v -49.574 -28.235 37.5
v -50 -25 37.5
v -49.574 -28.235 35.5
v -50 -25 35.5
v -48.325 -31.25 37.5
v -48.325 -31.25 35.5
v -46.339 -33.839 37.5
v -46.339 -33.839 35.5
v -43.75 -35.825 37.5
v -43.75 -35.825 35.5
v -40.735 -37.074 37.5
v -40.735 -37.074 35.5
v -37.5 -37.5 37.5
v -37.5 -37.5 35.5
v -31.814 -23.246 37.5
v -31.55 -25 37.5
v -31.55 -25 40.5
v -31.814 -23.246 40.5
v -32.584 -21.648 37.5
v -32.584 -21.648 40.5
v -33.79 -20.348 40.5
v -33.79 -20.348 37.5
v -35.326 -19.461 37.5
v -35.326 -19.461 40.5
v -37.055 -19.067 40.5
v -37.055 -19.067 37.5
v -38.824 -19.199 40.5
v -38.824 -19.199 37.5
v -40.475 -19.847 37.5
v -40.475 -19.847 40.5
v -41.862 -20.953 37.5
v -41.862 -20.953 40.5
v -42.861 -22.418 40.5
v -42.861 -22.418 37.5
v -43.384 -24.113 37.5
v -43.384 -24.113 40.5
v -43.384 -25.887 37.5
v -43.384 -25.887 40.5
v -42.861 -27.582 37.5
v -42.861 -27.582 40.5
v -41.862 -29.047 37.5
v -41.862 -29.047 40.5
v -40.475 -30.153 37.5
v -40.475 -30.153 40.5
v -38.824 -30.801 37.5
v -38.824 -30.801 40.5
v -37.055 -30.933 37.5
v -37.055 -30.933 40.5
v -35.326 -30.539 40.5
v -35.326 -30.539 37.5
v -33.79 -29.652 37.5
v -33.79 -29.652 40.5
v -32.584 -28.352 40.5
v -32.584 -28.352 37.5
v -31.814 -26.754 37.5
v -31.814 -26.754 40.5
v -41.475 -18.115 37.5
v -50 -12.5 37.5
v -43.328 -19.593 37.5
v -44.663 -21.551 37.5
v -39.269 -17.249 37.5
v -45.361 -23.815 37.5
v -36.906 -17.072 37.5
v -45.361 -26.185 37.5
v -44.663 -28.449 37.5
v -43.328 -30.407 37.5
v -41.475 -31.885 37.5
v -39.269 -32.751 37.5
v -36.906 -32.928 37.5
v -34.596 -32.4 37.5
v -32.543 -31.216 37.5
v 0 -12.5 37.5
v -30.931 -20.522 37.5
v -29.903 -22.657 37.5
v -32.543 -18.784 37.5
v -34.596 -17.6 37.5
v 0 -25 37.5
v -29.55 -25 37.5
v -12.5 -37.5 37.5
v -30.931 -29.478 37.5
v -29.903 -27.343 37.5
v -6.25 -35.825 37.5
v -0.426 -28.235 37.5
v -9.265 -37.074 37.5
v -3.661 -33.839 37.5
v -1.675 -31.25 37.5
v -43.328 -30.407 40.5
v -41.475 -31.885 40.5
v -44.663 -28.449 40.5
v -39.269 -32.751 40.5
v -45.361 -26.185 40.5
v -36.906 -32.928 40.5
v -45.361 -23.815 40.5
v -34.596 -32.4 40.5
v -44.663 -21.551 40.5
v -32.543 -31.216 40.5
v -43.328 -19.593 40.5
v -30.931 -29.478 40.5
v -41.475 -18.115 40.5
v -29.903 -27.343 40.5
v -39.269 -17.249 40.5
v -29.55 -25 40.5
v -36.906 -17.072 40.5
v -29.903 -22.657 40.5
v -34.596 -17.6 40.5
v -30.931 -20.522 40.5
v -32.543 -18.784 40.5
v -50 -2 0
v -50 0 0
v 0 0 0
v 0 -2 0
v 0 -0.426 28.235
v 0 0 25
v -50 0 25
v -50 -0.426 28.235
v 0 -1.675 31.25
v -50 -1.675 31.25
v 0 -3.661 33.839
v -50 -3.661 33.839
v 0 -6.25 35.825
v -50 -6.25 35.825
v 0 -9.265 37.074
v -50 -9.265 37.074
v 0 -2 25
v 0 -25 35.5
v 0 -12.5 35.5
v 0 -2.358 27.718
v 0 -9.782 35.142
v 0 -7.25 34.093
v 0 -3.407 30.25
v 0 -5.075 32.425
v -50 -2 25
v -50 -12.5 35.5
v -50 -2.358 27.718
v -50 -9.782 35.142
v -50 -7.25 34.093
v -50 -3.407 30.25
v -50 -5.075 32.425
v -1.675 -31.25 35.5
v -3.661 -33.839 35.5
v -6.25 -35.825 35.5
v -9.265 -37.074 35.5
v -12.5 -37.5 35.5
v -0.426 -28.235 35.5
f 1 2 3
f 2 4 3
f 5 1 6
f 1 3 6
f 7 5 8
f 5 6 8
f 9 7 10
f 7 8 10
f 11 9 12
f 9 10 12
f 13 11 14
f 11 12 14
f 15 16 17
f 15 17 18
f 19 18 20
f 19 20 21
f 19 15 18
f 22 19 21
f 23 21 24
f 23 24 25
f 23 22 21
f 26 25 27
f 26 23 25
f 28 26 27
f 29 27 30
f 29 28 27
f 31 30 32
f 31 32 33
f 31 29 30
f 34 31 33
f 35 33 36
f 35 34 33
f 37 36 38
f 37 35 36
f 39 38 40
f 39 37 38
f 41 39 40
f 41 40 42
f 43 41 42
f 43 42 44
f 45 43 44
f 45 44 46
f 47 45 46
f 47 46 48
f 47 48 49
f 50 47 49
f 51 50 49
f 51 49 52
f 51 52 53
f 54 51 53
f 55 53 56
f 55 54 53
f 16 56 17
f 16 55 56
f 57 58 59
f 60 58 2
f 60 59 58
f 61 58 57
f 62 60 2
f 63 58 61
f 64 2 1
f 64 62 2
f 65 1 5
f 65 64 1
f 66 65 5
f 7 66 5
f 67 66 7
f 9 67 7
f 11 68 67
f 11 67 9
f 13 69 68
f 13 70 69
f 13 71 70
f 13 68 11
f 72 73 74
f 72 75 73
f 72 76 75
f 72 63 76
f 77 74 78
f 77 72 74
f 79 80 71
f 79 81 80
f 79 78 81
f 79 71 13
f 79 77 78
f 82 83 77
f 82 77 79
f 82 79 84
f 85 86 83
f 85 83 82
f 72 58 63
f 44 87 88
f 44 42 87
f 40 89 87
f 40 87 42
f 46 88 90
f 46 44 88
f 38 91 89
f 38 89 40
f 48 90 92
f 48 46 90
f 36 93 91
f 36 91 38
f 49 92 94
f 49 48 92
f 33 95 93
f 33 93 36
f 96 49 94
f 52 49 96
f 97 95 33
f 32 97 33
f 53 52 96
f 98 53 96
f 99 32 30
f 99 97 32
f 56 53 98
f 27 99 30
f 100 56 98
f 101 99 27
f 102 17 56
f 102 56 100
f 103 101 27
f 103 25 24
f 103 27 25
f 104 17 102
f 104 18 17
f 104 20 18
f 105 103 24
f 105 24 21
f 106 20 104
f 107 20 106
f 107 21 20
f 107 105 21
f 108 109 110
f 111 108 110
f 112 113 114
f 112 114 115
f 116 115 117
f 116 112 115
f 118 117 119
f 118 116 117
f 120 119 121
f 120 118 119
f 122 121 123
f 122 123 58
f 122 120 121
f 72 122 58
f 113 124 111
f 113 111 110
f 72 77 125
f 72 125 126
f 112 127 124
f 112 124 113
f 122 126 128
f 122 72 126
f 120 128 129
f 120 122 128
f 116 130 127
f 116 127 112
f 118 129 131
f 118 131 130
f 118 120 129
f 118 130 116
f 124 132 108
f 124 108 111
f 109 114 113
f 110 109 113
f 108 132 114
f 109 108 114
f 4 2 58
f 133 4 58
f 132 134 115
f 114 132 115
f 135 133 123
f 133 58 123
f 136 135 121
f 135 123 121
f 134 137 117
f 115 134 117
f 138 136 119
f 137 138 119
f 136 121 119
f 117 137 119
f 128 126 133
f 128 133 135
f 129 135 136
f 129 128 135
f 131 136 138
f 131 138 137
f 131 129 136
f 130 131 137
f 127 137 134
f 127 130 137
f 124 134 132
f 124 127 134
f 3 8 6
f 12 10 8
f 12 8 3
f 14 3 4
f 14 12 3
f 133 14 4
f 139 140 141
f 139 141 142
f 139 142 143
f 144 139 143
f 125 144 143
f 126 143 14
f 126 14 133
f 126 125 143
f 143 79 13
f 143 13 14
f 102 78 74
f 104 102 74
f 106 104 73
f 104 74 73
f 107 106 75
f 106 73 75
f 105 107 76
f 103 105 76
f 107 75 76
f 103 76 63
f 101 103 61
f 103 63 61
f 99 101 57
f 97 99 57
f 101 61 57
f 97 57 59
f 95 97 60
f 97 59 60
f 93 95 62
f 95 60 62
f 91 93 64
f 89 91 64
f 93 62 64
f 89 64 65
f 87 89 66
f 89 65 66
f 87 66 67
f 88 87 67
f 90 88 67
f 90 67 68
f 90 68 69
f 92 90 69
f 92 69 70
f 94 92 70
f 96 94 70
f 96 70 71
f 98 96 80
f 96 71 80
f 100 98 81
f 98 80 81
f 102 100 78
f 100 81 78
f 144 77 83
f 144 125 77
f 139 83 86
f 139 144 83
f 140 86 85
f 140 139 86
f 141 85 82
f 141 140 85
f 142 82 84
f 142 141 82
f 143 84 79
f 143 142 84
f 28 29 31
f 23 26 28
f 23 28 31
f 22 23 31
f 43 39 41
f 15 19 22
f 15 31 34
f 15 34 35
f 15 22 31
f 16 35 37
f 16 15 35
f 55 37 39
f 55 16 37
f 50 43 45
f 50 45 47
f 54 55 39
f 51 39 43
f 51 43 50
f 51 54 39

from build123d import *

# Parameters (mm, degrees)
F0_W     = 50
F0_H     = 25
F1_DEPTH = 2
F3_DEPTH = 50
F4_R     = 12.5
F5_R     = 7.95
F5_R_2   = 5.95
F6_DEPTH = 3


with BuildPart() as f1:
    # F0 (on Front) → F1 (new body)
    with BuildSketch(Plane.XZ):
        with Locations((-25, 12.5)):
            Rectangle(F0_W, F0_H)
    extrude(amount=F1_DEPTH)

    # F2 (on Right) → F3 (join, through all)
    with BuildSketch(Plane.YZ):
        with BuildLine():
            Line((-2, 25), (0, 25))
            ThreePointArc((0, 25), (-3.6611652352, 33.8388347648), (-12.5, 37.5))
            Line((-12.5, 37.5), (-37.5, 37.5))
            Line((-37.5, 37.5), (-37.5, 35.5))
            Line((-37.5, 35.5), (-12.5, 35.5))
            ThreePointArc((-12.5, 35.5), (-5.0753787975, 32.4246212025), (-2, 25))
        make_face()
    extrude(amount=-F3_DEPTH)

    # F4
    f4_edges = [f1.edges().sort_by_distance(p)[0] for p in [
        (-50, -37.5, 36.5),
        (0, -37.5, 36.5),
    ]]
    fillet(f4_edges, radius=F4_R)

    # F5 (on face) → F6 (join)
    with BuildSketch(Plane.XY.offset(37.5)):
        with Locations((-37.5, -25)):
            Circle(F5_R)
        with Locations((-37.5, -25)):
            Circle(F5_R_2, mode=Mode.SUBTRACT)
    extrude(amount=F6_DEPTH)


solid = f1.part
